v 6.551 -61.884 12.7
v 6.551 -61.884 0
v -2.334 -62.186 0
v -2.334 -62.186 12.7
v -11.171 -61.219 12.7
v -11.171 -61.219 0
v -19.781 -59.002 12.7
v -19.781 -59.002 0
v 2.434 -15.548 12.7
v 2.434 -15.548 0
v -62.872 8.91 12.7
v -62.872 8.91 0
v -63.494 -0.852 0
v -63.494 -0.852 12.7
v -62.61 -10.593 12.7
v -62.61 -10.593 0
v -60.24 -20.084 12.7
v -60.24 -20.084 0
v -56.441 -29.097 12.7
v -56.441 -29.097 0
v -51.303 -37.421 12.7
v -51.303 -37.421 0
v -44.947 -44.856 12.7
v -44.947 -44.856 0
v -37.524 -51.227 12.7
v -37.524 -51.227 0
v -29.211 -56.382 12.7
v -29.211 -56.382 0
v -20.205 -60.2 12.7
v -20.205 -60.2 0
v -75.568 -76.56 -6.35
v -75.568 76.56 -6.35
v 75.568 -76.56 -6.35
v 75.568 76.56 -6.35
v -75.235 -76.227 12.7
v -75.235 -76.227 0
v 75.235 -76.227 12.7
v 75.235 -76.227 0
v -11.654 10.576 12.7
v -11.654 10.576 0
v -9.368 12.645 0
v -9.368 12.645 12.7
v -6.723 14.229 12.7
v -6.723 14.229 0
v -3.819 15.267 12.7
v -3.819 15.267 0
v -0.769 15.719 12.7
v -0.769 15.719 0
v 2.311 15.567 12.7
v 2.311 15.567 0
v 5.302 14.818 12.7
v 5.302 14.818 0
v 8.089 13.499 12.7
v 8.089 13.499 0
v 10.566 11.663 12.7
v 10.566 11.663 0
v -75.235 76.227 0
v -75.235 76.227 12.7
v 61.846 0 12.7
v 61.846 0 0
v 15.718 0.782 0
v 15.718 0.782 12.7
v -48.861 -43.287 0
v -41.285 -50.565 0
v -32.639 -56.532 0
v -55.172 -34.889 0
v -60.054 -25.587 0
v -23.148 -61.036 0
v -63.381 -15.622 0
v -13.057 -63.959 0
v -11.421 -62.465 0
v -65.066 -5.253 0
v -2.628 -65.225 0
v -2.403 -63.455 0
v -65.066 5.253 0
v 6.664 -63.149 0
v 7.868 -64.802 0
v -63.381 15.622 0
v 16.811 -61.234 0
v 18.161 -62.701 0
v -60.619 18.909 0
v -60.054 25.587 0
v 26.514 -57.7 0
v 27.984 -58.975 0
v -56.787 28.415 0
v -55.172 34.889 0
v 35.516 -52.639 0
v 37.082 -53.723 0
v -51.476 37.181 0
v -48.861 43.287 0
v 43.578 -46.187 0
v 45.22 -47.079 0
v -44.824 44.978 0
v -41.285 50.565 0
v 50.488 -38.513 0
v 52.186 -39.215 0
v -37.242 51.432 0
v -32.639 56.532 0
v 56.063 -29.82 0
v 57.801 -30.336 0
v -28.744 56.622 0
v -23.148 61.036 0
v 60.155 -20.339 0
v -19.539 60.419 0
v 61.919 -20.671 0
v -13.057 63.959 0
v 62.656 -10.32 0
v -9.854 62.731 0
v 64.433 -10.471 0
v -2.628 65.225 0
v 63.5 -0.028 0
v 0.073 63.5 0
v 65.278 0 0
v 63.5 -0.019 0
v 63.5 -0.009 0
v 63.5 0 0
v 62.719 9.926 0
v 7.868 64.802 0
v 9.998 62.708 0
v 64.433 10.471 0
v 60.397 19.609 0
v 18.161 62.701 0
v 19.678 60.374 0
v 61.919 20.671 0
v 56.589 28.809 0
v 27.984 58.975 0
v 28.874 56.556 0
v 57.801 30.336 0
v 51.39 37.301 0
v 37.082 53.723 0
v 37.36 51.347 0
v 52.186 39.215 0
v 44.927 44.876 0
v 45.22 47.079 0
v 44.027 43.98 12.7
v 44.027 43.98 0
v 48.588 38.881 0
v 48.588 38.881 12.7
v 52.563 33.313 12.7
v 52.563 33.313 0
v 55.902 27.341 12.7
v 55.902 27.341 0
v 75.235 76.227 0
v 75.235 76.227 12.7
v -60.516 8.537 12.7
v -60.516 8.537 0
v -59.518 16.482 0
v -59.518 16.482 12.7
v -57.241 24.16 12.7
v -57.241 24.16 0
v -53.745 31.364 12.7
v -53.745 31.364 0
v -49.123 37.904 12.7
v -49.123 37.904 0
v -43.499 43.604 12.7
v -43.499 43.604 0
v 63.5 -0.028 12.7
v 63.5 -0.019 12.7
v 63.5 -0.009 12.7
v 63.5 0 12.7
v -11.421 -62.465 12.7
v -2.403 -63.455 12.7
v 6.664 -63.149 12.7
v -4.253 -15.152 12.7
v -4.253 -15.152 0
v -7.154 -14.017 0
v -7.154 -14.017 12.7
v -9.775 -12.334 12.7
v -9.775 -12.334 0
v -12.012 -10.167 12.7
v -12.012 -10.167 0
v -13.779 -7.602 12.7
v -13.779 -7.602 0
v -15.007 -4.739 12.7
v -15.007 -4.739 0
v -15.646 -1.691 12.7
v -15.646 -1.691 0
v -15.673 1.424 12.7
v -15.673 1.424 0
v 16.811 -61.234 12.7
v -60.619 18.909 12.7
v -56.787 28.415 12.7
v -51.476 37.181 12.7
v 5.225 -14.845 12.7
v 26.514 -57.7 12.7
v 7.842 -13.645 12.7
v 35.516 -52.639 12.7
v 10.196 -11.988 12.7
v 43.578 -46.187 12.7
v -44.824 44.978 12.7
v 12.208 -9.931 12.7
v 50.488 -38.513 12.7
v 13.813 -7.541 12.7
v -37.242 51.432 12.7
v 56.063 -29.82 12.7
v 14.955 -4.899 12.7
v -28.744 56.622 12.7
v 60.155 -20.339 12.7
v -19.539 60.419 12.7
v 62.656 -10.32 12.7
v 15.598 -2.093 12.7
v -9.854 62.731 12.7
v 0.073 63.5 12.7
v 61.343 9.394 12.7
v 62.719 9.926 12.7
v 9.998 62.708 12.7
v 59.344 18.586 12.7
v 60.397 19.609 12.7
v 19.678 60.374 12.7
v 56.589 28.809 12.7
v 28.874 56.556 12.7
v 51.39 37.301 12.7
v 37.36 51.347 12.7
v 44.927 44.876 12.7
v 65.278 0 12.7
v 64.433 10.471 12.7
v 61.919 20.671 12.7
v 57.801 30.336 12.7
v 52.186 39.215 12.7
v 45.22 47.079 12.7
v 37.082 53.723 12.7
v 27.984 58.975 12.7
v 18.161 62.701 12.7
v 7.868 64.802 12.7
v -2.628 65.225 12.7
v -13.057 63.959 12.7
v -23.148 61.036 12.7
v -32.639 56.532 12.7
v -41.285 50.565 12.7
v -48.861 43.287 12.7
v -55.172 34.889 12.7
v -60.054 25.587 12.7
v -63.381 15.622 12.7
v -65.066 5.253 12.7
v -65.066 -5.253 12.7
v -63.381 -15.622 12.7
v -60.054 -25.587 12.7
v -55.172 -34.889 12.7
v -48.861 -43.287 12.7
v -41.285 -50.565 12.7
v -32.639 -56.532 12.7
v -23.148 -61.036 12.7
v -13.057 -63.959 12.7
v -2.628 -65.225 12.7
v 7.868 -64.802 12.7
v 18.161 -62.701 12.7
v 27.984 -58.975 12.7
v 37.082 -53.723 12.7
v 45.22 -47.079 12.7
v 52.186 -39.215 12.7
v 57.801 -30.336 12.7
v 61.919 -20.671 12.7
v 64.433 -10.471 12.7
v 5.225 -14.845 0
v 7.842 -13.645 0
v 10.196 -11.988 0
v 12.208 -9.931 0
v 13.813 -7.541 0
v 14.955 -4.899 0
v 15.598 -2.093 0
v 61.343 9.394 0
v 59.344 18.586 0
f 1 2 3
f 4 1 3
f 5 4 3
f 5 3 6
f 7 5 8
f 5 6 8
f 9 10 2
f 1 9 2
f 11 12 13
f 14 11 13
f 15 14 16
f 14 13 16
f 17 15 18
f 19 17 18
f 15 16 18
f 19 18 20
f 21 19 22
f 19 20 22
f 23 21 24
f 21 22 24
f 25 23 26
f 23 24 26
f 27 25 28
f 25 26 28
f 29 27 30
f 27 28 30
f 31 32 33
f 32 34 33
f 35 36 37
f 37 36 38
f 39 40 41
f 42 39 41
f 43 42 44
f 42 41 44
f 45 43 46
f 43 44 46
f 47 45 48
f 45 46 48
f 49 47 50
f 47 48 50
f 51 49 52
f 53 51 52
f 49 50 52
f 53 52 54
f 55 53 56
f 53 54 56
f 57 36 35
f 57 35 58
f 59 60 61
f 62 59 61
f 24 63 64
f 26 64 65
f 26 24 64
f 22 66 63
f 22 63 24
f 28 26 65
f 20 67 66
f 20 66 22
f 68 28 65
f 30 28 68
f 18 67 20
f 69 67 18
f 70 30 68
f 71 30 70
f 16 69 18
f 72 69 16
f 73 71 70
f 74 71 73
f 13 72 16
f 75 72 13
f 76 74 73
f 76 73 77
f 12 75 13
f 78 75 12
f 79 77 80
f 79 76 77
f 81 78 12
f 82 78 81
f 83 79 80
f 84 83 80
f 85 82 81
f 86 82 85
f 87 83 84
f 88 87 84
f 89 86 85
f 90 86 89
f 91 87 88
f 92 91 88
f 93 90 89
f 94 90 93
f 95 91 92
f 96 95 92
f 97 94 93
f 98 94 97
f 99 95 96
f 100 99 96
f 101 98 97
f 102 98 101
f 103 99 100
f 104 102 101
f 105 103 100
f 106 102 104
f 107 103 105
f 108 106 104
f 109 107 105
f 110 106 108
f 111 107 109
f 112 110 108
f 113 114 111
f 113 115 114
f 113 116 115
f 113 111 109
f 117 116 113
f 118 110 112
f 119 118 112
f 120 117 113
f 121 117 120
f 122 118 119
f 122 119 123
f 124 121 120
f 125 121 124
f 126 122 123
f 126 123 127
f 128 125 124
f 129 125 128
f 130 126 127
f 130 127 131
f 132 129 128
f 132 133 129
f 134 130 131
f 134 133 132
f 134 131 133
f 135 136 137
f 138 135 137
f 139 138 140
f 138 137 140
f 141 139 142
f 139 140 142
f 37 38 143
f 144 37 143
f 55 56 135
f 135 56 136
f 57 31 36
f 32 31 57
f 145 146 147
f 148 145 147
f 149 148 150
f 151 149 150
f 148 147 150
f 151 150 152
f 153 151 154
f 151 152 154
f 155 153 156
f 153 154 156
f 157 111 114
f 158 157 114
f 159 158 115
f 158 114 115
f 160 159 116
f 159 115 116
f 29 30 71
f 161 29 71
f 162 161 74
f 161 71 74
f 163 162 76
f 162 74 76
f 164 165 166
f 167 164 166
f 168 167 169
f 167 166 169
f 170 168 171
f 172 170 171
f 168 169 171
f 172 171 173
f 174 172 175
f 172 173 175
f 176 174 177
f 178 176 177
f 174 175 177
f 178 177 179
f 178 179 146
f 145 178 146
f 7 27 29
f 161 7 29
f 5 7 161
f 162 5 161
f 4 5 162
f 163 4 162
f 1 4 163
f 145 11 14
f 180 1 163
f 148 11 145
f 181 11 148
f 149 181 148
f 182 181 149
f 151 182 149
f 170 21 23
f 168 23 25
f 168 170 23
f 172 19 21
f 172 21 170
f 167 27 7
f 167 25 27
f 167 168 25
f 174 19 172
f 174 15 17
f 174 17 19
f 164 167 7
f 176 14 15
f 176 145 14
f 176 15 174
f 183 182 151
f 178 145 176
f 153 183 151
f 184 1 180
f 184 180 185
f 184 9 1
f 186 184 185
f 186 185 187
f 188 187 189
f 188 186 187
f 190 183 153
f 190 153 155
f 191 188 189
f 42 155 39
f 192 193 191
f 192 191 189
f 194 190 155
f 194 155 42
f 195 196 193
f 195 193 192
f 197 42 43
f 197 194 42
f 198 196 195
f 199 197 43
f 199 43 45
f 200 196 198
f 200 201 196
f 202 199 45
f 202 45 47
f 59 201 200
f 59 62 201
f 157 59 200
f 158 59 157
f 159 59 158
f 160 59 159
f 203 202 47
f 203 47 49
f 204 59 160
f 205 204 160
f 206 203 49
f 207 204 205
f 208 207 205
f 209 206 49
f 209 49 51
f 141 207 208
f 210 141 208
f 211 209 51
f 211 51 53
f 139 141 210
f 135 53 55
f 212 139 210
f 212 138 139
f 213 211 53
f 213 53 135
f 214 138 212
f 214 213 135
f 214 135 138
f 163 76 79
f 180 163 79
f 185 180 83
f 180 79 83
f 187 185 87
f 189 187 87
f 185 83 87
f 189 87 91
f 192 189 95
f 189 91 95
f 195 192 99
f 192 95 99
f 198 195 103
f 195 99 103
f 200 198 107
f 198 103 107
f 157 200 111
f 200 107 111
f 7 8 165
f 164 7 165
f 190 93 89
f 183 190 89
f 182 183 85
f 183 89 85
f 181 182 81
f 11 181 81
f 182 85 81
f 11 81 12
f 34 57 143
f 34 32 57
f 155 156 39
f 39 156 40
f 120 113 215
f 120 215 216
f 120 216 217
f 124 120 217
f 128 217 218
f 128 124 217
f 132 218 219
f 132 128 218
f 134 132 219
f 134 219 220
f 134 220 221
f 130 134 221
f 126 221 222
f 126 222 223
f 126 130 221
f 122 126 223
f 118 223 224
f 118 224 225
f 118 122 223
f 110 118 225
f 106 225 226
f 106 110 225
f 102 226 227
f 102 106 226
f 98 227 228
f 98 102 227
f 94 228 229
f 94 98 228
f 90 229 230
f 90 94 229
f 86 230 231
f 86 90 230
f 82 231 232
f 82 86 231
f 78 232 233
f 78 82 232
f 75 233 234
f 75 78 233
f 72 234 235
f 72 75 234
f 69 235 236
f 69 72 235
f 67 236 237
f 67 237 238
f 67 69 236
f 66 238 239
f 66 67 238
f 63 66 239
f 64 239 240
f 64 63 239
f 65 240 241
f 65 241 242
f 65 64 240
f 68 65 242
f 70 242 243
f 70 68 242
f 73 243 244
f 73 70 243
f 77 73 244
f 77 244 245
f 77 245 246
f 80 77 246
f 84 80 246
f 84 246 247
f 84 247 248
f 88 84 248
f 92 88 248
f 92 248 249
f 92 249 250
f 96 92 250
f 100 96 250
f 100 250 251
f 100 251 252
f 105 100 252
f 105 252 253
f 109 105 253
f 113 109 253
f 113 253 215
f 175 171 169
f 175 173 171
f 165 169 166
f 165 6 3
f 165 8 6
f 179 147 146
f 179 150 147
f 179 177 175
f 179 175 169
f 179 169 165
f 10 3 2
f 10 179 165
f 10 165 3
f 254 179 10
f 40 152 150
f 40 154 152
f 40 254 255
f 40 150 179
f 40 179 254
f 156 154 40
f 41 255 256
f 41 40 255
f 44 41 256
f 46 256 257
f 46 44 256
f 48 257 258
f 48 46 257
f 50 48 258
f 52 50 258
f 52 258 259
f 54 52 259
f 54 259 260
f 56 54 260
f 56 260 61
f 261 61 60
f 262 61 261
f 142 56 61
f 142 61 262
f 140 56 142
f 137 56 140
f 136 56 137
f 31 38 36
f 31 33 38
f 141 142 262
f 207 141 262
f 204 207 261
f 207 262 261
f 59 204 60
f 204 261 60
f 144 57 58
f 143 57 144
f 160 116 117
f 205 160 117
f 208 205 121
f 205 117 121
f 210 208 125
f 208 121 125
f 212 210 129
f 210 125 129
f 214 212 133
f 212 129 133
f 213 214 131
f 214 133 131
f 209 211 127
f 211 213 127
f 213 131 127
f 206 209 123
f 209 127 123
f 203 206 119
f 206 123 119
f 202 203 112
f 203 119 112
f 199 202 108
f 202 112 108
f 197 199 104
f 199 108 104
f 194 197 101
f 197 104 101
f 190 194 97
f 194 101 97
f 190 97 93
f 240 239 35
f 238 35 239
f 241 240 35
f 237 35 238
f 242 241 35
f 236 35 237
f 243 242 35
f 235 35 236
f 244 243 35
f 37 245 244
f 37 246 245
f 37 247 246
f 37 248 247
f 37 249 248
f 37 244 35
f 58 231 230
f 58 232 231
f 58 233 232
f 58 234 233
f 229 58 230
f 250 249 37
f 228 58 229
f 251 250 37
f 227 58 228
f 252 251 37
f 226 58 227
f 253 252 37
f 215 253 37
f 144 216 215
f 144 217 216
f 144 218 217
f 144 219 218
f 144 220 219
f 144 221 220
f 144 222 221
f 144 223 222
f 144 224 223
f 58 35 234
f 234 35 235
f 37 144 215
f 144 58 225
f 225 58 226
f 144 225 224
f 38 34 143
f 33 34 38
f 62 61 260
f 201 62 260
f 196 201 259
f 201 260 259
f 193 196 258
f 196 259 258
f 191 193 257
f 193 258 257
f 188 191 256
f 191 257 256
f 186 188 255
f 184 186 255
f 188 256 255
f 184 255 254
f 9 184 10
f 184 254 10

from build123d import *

# Parameters (mm, degrees)
F1_DEPTH  = 12.7
F0_R      = 72.898
F0_R_2    = 65.278
F2_DEPTH  = 12.7
F4_R      = 72.898
F5_DEPTH  = 6.35
F6_DEPTH  = 12.7
F8_W      = 150.4707932472
F8_H      = 152.4543464184
F8_R      = 72.898
F9_DEPTH  = 12.7
F9_FACE_W = 150.4707932472
F9_FACE_H = 152.4543464184
F9_FACE_R = 72.898
F12_DEPTH = 6.35
F12_TAPER = -3


# Not quite as in the source:
# - the program builds the solid bodies; features that only make, move or delete a surface that nothing else refers to are left out


with BuildPart() as f1:
    # F0 (on Top) → F1 (new body)
    with BuildSketch(Plane.XY):
        with BuildLine():
            Line((44.0266140713, 43.9798835084), (44.9402432342, 44.8622841377))
            ThreePointArc((44.9402432342, 44.8622841377), (0.0822011404, 63.499946795), (-44.8239437094, 44.9784845269))
            Line((-44.8239437094, 44.9784845269), (-43.499038361, 43.6043470536))
            Line((-43.499038361, 43.6043470536), (-11.6539793168, 10.5759582539))
            ThreePointArc((-11.6539793168, 10.5759582539), (-0.7689783294, 15.718613146), (10.5660161344, 11.662994039))
            Line((10.5660161344, 11.662994039), (44.0266140713, 43.9798835084))
        make_face()
    extrude(amount=F1_DEPTH)



with BuildPart() as f1b:
    # F0 (on Top) → F1, piece 2 (new body)
    with BuildSketch(Plane.XY):
        with BuildLine():
            ThreePointArc((6.6638546501, -63.1493708694), (47.1891587684, -42.4903906164), (63.4999938049, -0.0280496613))
            Line((63.4999938049, -0.0280496613), (61.8462218281, 0))
            Line((61.8462218281, 0), (15.7179516616, 0.78238256))
            ThreePointArc((15.7179516616, 0.78238256), (12.2084926851, -9.9307015494), (2.4344132667, -15.5479824721))
            Line((2.4344132667, -15.5479824721), (6.5514407483, -61.8841783021))
            Line((6.5514407483, -61.8841783021), (6.6638546501, -63.1493708694))
        make_face()
    extrude(amount=F1_DEPTH)


with BuildPart() as f1c:
    # F0 (on Top) → F1, piece 3 (new body)
    with BuildSketch(Plane.XY):
        with BuildLine():
            Line((-60.5164809282, 8.5368217163), (-62.8717330434, 8.9103975287))
            ThreePointArc((-62.8717330434, 8.9103975287), (-54.0323144536, -33.3580424304), (-20.2050848869, -60.1997055202))
            Line((-20.2050848869, -60.1997055202), (-19.7810930248, -59.0023835005))
            Line((-19.7810930248, -59.0023835005), (-4.2528877081, -15.1518669823))
            ThreePointArc((-4.2528877081, -15.1518669823), (-12.9594991488, -8.928466202), (-15.6728541768, 1.4239974924))
            Line((-15.6728541768, 1.4239974924), (-60.5164809282, 8.5368217163))
        make_face()
    extrude(amount=F1_DEPTH)


with BuildPart() as f2:
    # F0 (on Top) → F2 (new body)
    with BuildSketch(Plane.XY):
        Circle(F0_R)
        Circle(F0_R_2, mode=Mode.SUBTRACT)
    extrude(amount=F2_DEPTH)


with BuildPart() as f1_1:
    add(f1.part)

    add(f1b.part)  # F5 merges F1b

    add(f1c.part)  # F5 merges F1c

    add(f2.part)  # F5 merges F2
    # F4 (on Top) → F5 (join)
    with BuildSketch(Plane.XY):
        Circle(F4_R)
    extrude(amount=-F5_DEPTH)

    # F0 (on Top) → F6 (join)
    with BuildSketch(Plane.XY):
        with BuildLine():
            ThreePointArc((63.4999938049, -0.0280496613), (63.4999984512, -0.014024831), (63.5, 0))
            ThreePointArc((63.5, 0), (58.6768925787, 24.2749310465), (44.9402432342, 44.8622841377))
            Line((44.9402432342, 44.8622841377), (44.0266140713, 43.9798835084))
            ThreePointArc((44.0266140713, 43.9798835084), (50.6520952134, 36.1515995564), (55.9018661031, 27.3414386269))
            ThreePointArc((55.9018661031, 27.3414386269), (60.528045967, 14.0303191282), (61.8462218281, 0))
            Line((61.8462218281, 0), (63.4999938049, -0.0280496613))
        make_face()
        with BuildLine():
            Line((44.0266140713, 43.9798835084), (44.9402432342, 44.8622841377))
            ThreePointArc((44.9402432342, 44.8622841377), (0.0822011404, 63.499946795), (-44.8239437094, 44.9784845269))
            Line((-44.8239437094, 44.9784845269), (-43.499038361, 43.6043470536))
            Line((-43.499038361, 43.6043470536), (-11.6539793168, 10.5759582539))
            ThreePointArc((-11.6539793168, 10.5759582539), (-0.7689783294, 15.718613146), (10.5660161344, 11.662994039))
            Line((10.5660161344, 11.662994039), (44.0266140713, 43.9798835084))
        make_face()
        with BuildLine():
            ThreePointArc((6.6638546501, -63.1493708694), (47.1891587684, -42.4903906164), (63.4999938049, -0.0280496613))
            Line((63.4999938049, -0.0280496613), (61.8462218281, 0))
            Line((61.8462218281, 0), (15.7179516616, 0.78238256))
            ThreePointArc((15.7179516616, 0.78238256), (12.2084926851, -9.9307015494), (2.4344132667, -15.5479824721))
            Line((2.4344132667, -15.5479824721), (6.5514407483, -61.8841783021))
            Line((6.5514407483, -61.8841783021), (6.6638546501, -63.1493708694))
        make_face()
        with BuildLine():
            Line((-43.499038361, 43.6043470536), (-44.8239437094, 44.9784845269))
            ThreePointArc((-44.8239437094, 44.9784845269), (-56.7874671273, 28.4153757192), (-62.8717330434, 8.9103975287))
            Line((-62.8717330434, 8.9103975287), (-60.5164809282, 8.5368217163))
            ThreePointArc((-60.5164809282, 8.5368217163), (-55.6398831968, 27.8331682386), (-43.499038361, 43.6043470536))
        make_face()
        with BuildLine():
            ThreePointArc((-20.2050848869, -60.1997055202), (-6.929383847, -63.1207861128), (6.6638546501, -63.1493708694))
            Line((6.6638546501, -63.1493708694), (6.5514407483, -61.8841783021))
            ThreePointArc((6.5514407483, -61.8841783021), (-6.7699416658, -61.8606562351), (-19.7810930248, -59.0023835005))
            Line((-19.7810930248, -59.0023835005), (-20.2050848869, -60.1997055202))
        make_face()
        with BuildLine():
            Line((-60.5164809282, 8.5368217163), (-62.8717330434, 8.9103975287))
            ThreePointArc((-62.8717330434, 8.9103975287), (-54.0323144536, -33.3580424304), (-20.2050848869, -60.1997055202))
            Line((-20.2050848869, -60.1997055202), (-19.7810930248, -59.0023835005))
            Line((-19.7810930248, -59.0023835005), (-4.2528877081, -15.1518669823))
            ThreePointArc((-4.2528877081, -15.1518669823), (-12.9594991488, -8.928466202), (-15.6728541768, 1.4239974924))
            Line((-15.6728541768, 1.4239974924), (-60.5164809282, 8.5368217163))
        make_face()
    extrude(amount=F6_DEPTH)



with BuildPart() as f6:
    # F0 (on Top) → F6, piece 2 (new body)
    with BuildSketch(Plane.XY):
        Circle(F0_R)
        Circle(F0_R_2, mode=Mode.SUBTRACT)
    extrude(amount=F6_DEPTH)


with BuildPart() as f1_2:
    add(f1_1.part)

    add(f6.part)  # F9 merges F6
    # F8 (on face) → F9 (join)
    with BuildSketch(Plane.XY):
        Rectangle(F8_W, F8_H)
        Circle(F8_R, mode=Mode.SUBTRACT)
    extrude(amount=F9_DEPTH)

    # F9_face (on face) → F12 (join)
    with BuildSketch(Plane(origin=(0, 0, 0), x_dir=(1, 0, 0), z_dir=(0, 0, -1))):
        Rectangle(F9_FACE_W, F9_FACE_H)
        Circle(F9_FACE_R, mode=Mode.SUBTRACT)
    extrude(amount=F12_DEPTH, taper=F12_TAPER)


solid = f1_2.part
